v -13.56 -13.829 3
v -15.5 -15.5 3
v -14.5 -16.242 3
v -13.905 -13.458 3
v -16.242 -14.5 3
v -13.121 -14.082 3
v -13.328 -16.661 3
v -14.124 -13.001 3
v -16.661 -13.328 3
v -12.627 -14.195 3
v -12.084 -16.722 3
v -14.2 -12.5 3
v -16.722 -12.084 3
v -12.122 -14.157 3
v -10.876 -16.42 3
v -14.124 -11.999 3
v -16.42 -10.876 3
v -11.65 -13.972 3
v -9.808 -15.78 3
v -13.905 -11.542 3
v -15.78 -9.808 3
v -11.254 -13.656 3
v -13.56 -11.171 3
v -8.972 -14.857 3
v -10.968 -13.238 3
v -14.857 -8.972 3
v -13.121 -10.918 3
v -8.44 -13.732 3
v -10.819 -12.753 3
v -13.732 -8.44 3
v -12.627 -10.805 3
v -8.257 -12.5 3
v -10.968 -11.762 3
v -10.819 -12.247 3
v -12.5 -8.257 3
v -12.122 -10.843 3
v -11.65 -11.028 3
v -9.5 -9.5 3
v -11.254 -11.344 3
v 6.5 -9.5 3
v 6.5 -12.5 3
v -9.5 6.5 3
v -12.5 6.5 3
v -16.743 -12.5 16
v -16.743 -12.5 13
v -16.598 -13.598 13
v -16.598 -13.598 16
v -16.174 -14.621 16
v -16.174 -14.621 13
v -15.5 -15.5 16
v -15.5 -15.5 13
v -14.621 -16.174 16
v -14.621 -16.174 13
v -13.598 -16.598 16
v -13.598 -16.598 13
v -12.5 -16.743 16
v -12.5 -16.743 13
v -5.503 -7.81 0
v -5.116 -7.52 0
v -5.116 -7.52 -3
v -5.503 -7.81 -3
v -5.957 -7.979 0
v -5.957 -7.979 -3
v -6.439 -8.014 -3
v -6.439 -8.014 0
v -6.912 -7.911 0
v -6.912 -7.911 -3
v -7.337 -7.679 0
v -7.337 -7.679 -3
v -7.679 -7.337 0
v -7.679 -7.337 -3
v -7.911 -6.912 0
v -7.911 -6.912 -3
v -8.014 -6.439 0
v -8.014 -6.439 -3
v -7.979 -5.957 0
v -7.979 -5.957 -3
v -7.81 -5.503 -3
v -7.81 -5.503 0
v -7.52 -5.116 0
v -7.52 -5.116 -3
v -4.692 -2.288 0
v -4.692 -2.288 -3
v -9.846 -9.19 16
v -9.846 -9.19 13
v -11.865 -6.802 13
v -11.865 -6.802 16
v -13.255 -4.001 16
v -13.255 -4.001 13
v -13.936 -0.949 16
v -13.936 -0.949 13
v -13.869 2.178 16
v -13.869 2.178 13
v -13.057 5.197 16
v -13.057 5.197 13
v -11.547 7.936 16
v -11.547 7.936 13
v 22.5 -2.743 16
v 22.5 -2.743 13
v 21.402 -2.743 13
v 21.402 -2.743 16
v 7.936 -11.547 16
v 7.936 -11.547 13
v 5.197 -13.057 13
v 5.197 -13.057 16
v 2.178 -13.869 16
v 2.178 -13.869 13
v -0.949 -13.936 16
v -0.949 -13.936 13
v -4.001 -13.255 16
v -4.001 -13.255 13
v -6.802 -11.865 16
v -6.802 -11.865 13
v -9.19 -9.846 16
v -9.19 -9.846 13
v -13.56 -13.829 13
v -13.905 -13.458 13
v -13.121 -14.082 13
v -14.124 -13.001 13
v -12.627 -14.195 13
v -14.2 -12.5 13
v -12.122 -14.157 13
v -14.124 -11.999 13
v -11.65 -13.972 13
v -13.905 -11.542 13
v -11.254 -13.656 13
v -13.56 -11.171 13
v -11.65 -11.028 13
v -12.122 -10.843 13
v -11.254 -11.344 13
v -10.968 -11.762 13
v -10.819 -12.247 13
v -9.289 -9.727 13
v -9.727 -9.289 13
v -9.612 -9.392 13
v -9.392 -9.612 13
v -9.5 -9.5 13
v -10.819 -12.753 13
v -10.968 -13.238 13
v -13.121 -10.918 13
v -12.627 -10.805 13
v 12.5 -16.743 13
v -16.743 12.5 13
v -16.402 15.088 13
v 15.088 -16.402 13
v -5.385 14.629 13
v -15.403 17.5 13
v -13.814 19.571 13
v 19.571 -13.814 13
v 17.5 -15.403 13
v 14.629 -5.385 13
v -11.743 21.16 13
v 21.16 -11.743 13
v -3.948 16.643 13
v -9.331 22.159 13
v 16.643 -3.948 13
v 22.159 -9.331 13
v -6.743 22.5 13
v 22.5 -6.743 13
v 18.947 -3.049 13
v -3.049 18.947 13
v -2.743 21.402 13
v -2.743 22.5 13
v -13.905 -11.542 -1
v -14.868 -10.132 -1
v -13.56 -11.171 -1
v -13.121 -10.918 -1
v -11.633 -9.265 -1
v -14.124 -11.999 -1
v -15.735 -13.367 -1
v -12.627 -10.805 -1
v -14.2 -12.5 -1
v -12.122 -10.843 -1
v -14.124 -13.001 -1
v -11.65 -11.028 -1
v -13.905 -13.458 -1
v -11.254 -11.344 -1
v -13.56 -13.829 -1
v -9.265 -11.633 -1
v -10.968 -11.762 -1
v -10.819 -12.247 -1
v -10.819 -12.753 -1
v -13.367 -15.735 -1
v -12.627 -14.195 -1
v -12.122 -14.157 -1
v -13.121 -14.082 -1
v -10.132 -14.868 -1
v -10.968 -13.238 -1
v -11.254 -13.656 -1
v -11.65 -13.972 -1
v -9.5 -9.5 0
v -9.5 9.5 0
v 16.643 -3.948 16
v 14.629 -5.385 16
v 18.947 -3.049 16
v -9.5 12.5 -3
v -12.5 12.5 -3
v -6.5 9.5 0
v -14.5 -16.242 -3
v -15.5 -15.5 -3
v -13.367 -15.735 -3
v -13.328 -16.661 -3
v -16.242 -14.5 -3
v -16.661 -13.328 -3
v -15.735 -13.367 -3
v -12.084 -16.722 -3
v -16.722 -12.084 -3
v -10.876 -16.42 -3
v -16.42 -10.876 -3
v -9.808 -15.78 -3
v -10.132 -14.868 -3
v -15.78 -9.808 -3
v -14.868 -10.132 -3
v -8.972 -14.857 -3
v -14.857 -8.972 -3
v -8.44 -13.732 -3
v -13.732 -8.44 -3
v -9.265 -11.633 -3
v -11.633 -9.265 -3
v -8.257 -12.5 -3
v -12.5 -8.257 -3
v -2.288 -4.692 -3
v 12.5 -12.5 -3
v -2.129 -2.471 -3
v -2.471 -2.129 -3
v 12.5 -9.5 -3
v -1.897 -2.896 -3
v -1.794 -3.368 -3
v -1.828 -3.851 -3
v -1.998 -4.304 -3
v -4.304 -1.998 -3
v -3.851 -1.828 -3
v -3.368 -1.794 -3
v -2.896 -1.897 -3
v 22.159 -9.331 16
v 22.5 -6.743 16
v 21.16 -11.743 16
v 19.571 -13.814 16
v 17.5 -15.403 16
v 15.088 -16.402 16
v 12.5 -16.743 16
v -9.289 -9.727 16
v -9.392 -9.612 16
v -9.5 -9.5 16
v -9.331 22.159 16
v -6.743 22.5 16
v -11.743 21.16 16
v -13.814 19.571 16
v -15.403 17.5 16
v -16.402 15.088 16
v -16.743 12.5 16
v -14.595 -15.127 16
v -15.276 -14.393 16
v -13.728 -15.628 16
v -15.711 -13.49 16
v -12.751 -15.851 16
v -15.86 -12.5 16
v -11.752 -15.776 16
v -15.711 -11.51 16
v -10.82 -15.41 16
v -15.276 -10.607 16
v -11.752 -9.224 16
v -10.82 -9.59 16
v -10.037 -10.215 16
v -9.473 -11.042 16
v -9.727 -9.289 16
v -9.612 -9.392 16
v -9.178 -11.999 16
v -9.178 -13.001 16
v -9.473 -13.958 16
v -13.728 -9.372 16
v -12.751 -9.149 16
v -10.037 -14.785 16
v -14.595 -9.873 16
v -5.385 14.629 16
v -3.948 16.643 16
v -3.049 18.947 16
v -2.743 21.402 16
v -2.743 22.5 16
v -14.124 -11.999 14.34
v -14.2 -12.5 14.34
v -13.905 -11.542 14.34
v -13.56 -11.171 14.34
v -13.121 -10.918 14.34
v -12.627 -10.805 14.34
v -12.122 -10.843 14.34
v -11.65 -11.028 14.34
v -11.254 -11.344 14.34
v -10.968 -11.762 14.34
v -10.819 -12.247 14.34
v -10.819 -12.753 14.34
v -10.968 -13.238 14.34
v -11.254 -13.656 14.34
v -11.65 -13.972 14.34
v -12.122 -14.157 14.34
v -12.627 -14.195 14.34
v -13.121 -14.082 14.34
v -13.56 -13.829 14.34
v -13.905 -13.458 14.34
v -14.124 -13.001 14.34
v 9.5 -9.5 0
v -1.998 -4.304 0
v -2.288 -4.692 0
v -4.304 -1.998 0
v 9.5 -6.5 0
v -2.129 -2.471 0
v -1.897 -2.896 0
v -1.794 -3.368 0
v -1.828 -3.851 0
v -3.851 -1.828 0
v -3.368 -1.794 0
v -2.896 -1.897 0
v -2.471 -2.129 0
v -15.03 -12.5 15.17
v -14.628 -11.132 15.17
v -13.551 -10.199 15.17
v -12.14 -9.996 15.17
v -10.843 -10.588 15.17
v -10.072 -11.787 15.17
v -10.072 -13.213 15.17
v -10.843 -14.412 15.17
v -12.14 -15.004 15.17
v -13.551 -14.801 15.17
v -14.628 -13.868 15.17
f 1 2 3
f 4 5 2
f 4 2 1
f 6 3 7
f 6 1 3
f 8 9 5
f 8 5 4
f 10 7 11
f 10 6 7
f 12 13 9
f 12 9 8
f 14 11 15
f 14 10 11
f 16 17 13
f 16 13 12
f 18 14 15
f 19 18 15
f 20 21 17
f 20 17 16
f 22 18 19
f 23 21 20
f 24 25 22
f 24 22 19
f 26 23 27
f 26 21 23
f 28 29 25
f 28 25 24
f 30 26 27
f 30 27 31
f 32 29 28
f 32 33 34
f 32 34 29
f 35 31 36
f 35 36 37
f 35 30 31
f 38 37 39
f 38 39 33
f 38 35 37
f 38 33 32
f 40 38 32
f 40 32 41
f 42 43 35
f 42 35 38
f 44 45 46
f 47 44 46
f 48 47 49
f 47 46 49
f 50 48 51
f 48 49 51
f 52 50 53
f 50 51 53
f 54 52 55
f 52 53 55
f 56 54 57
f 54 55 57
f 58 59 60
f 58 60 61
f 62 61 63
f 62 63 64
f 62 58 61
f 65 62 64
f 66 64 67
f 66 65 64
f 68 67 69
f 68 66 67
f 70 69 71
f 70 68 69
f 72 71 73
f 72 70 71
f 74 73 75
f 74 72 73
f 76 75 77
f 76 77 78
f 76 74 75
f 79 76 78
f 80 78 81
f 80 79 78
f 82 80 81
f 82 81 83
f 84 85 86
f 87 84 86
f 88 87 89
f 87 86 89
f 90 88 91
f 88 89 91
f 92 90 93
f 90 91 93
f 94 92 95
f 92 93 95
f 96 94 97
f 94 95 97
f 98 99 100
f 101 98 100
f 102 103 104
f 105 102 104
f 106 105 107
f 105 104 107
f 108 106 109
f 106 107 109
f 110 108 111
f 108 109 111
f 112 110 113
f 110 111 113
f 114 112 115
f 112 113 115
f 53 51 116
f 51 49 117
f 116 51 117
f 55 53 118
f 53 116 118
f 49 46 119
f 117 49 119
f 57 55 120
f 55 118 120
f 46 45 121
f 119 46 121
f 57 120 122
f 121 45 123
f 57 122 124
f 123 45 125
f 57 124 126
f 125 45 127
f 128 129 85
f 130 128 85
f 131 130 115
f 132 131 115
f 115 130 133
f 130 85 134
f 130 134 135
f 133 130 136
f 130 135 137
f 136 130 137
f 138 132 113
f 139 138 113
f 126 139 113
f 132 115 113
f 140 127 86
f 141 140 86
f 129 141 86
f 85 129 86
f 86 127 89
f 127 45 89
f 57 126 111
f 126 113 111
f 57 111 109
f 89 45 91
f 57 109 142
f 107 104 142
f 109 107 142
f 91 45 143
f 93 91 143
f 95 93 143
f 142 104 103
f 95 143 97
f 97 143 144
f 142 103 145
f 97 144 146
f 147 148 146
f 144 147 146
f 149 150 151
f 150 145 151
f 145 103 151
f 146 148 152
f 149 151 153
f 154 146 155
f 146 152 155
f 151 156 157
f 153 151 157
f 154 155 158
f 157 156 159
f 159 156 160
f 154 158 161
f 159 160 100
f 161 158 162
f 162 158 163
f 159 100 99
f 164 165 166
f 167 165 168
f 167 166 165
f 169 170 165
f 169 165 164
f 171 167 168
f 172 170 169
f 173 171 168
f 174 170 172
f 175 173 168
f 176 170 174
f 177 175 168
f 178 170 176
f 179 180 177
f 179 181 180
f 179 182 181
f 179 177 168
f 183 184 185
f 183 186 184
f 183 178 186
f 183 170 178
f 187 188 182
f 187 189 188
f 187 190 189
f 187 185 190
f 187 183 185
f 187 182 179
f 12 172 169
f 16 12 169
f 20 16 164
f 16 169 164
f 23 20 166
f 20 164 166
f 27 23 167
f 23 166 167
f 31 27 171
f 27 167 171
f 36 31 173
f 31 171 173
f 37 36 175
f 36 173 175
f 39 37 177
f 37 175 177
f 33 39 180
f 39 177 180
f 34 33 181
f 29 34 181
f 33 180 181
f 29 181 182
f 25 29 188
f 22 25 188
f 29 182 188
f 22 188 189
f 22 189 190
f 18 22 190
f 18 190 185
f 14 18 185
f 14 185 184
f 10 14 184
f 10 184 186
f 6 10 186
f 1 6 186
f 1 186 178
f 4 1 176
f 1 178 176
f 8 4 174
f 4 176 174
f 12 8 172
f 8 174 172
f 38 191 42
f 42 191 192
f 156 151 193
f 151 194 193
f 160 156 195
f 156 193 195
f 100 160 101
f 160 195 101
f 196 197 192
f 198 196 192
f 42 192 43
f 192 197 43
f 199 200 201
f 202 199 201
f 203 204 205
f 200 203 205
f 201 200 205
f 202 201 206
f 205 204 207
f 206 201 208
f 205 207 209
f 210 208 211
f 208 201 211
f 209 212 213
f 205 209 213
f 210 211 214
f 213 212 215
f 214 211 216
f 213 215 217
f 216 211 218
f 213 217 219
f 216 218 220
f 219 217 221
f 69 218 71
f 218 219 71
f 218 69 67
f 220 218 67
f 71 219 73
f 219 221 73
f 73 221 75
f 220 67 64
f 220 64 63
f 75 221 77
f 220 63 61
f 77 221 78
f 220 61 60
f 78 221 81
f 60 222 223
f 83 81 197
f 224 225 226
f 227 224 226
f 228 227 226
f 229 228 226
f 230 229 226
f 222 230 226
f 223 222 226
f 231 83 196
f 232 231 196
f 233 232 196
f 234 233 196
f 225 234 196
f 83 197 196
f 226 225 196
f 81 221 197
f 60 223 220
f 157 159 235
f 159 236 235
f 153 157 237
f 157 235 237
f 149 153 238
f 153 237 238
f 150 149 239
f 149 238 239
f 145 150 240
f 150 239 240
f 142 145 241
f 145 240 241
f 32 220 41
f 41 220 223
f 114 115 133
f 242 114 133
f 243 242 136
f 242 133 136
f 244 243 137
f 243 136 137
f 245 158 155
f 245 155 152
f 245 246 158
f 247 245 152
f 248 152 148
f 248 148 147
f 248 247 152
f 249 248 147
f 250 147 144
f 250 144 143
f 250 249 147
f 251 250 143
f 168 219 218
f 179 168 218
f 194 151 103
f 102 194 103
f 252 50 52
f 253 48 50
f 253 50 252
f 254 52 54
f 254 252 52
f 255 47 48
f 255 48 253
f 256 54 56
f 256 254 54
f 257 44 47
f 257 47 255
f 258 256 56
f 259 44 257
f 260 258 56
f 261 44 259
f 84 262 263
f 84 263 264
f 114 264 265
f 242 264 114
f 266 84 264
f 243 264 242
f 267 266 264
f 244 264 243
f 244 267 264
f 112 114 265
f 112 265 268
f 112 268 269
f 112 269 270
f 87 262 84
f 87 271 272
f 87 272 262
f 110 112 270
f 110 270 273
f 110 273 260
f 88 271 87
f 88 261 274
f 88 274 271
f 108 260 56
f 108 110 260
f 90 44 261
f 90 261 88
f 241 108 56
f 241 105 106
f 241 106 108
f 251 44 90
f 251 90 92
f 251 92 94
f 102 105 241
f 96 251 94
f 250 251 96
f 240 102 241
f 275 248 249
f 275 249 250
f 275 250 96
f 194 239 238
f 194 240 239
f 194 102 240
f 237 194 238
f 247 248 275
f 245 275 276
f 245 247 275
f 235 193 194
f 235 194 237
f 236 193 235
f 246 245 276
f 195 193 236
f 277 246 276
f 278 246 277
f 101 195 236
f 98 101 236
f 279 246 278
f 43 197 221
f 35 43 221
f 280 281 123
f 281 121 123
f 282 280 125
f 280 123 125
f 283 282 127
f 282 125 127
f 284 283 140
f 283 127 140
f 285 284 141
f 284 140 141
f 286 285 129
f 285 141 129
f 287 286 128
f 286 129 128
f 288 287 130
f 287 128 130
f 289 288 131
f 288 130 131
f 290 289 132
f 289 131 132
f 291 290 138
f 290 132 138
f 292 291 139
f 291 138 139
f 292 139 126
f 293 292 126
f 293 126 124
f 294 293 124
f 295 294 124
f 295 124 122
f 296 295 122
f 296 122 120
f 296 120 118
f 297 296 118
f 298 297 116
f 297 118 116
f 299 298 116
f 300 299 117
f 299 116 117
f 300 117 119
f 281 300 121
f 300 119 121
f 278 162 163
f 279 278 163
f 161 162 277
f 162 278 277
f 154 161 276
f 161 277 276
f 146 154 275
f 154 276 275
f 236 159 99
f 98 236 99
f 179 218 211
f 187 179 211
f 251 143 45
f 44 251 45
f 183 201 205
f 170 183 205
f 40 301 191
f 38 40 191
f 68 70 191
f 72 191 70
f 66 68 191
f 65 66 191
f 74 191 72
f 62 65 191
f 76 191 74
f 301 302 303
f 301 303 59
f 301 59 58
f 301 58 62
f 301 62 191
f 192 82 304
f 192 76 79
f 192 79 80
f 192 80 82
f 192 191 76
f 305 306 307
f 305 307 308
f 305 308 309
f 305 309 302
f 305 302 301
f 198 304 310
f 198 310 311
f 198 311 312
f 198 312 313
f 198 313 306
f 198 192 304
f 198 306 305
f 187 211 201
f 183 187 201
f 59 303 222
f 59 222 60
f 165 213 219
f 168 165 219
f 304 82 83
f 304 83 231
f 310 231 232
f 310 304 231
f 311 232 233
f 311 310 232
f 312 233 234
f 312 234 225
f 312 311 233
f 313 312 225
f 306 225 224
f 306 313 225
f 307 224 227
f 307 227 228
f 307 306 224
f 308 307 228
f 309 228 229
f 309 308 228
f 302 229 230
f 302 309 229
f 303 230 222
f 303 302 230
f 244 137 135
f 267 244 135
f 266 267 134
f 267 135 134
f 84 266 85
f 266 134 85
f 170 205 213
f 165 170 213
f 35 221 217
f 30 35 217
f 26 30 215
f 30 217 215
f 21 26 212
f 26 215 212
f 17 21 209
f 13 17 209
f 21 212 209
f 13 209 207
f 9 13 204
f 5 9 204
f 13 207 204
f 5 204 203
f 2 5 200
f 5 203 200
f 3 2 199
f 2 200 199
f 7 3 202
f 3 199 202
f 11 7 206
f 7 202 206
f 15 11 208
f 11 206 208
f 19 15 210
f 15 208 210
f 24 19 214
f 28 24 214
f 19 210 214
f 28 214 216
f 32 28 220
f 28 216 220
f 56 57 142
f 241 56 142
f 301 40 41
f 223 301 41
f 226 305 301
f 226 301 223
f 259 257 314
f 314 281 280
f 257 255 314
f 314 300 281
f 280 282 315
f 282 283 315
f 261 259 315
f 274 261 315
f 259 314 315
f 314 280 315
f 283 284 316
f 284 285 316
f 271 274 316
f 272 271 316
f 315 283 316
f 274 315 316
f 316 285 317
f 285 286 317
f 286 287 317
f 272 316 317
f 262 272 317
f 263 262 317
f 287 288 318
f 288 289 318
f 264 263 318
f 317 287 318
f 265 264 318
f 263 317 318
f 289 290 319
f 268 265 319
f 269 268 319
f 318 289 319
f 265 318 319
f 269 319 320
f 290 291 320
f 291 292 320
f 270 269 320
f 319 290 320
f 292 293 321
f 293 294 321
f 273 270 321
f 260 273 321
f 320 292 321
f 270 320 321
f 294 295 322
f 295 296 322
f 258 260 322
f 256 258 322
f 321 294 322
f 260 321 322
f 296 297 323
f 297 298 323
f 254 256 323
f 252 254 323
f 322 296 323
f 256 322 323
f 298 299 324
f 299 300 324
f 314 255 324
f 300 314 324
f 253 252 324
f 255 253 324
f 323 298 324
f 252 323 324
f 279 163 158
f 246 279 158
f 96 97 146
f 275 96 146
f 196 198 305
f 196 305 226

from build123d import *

# Parameters (mm, degrees)
F1_DEPTH         = 3
F2_DEPTH         = 3
F5_DEPTH         = 3
F7_D             = 3.4
F7_DEPTH         = 50
F7_CSINK_D       = 6.72
F7_CSINK_ANGLE   = 90
F7_TIP           = 1.0214630523
F7_2_D           = 3.4
F7_2_DEPTH       = 50
F7_2_CSINK_D     = 6.72
F7_2_CSINK_ANGLE = 90
F7_2_TIP         = 1.0214630523
F9_DEPTH         = 2
F10_R            = 10
F11_T1_DEPTH     = 33.8601958556
F11_T3_DEPTH     = 33.8601958556


# Not quite as in the source:
# - a fillet or chamfer that OpenCascade refuses, or shapes differently, is made with other operations: its cross-section is extruded or revolved along the edge and cut away or added
# - a feature names something its author has since deleted; it is built from what else it names


with BuildPart() as f1:
    # F0 (on Top) → F1 (new body)
    with BuildSketch(Plane.XY):
        with BuildLine():
            ThreePointArc((-12.5, -8.2573593129), (-10.8764116996, -8.5803111054), (-9.5, -9.5))
            Line((-9.5, -9.5), (-9.5, 12.5))
            Line((-9.5, 12.5), (-12.5, 12.5))
            Line((-12.5, 12.5), (-12.5, -8.2573593129))
        make_face()
        with BuildLine():
            Line((-8.2573593129, -12.5), (12.5, -12.5))
            Line((12.5, -12.5), (12.5, -9.5))
            Line((12.5, -9.5), (-9.5, -9.5))
            ThreePointArc((-9.5, -9.5), (-8.5803111054, -10.8764116996), (-8.2573593129, -12.5))
        make_face()
        with BuildLine():
            Line((-12.5, -12.5), (-8.2573593129, -12.5))
            ThreePointArc((-8.2573593129, -12.5), (-8.5803111054, -10.8764116996), (-9.5, -9.5))
            ThreePointArc((-9.5, -9.5), (-10.8764116996, -8.5803111054), (-12.5, -8.2573593129))
            Line((-12.5, -8.2573593129), (-12.5, -12.5))
        make_face()
        with BuildLine():
            ThreePointArc((-12.5, -8.2573593129), (-15.5, -15.5), (-8.2573593129, -12.5))
            Line((-8.2573593129, -12.5), (-12.5, -12.5))
            Line((-12.5, -12.5), (-12.5, -8.2573593129))
        make_face()
        Polygon((-9.5, -9.5), (12.5, -9.5), (-9.5, 12.5), align=None)
        with BuildLine():
            Line((-2.2875108319, -4.6916738879), (-5.1159379566, -7.5201010127))
            ThreePointArc((-5.1159379566, -7.5201010127), (-7.5201010127, -7.5201010127), (-7.5201010127, -5.1159379566))
            Line((-7.5201010127, -5.1159379566), (-4.6916738879, -2.2875108319))
            ThreePointArc((-4.6916738879, -2.2875108319), (-2.2875108319, -2.2875108319), (-2.2875108319, -4.6916738879))
        make_face(mode=Mode.SUBTRACT)
    extrude(amount=-F1_DEPTH)

    # F0 (on Top) → F2 (join)
    with BuildSketch(Plane.XY):
        with BuildLine():
            ThreePointArc((-12.5, -8.2573593129), (-15.5, -15.5), (-8.2573593129, -12.5))
            Line((-8.2573593129, -12.5), (-12.5, -12.5))
            Line((-12.5, -12.5), (-12.5, -8.2573593129))
        make_face()
        with BuildLine():
            Line((-12.5, -12.5), (-8.2573593129, -12.5))
            ThreePointArc((-8.2573593129, -12.5), (-8.5803111054, -10.8764116996), (-9.5, -9.5))
            ThreePointArc((-9.5, -9.5), (-10.8764116996, -8.5803111054), (-12.5, -8.2573593129))
            Line((-12.5, -8.2573593129), (-12.5, -12.5))
        make_face()
        with BuildLine():
            ThreePointArc((-12.5, -8.2573593129), (-10.8764116996, -8.5803111054), (-9.5, -9.5))
            Line((-9.5, -9.5), (-9.5, 12.5))
            Line((-9.5, 12.5), (-12.5, 12.5))
            Line((-12.5, 12.5), (-12.5, -8.2573593129))
        make_face()
        with BuildLine():
            Line((-8.2573593129, -12.5), (12.5, -12.5))
            Line((12.5, -12.5), (12.5, -9.5))
            Line((12.5, -9.5), (-9.5, -9.5))
            ThreePointArc((-9.5, -9.5), (-8.5803111054, -10.8764116996), (-8.2573593129, -12.5))
        make_face()
    extrude(amount=F2_DEPTH)

    # F7
    with Locations(Plane.XY.offset(16)):
        with Locations((-12.5, -12.5)):
            CounterSinkHole(F7_D / 2, F7_CSINK_D / 2, depth=F7_DEPTH, counter_sink_angle=F7_CSINK_ANGLE)
            with Locations((0, 0, -(F7_DEPTH + F7_TIP / 2))):  # 118° drill point
                Cone(0, F7_D / 2, F7_TIP, mode=Mode.SUBTRACT)

    # F8 (on face) → F9 (cut)
    with BuildSketch(Plane(origin=(0, 0, -3), x_dir=(1, 0, 0), z_dir=(0, 0, -1))):
        Polygon((-13.3666896231, 15.7345297078), (-15.7345297078, 13.3666896231), (-14.8678400847, 10.1321599153), (-11.6333103769, 9.2654702922), (-9.2654702922, 11.6333103769), (-10.1321599153, 14.8678400847), align=None)
    extrude(amount=-F9_DEPTH, mode=Mode.SUBTRACT)

    # F11: chamfer of 6 on 2 edges, made by hand

    # F11_s2 → F11_t1 (cut)
    with BuildSketch(Plane.XZ.offset(-5.9300979278)):
        Polygon((6.5, 3), (12.5, -3), (12.5, 3), align=None)
    extrude(amount=F11_T1_DEPTH, mode=Mode.SUBTRACT)

    # F11_s4 → F11_t3 (cut)
    with BuildSketch(Plane.YZ.offset(-27.9300979278)):
        Polygon((12.5, -3), (6.5, 3), (12.5, 3), align=None)
    extrude(amount=F11_T3_DEPTH, mode=Mode.SUBTRACT)


with BuildPart() as f5:
    # F4 (on offset) → F5 (new body)
    with BuildSketch(Plane.XY.offset(13)):
        with BuildLine():
            ThreePointArc((-9.8464677493, -9.1895972156), (-14.3360305156, -8.6752134771), (-16.7426406871, -12.5))
            ThreePointArc((-16.7426406871, -12.5), (-15.5, -15.5), (-12.5, -16.7426406871))
            ThreePointArc((-12.5, -16.7426406871), (-9.5, -15.5), (-8.2573593129, -12.5))
            ThreePointArc((-8.2573593129, -12.5), (-8.497197885, -11.0937371412), (-9.1895972156, -9.8464677493))
            ThreePointArc((-9.1895972156, -9.8464677493), (-9.3463484327, -9.6746223732), (-9.5, -9.5))
            ThreePointArc((-9.5, -9.5), (-9.6746223732, -9.3463484327), (-9.8464677493, -9.1895972156))
        make_face()
        with BuildLine():
            Line((-16.7426406871, 22.5), (-16.7426406871, -12.5))
            ThreePointArc((-16.7426406871, -12.5), (-14.3360305156, -8.6752134771), (-9.8464677493, -9.1895972156))
            ThreePointArc((-9.8464677493, -9.1895972156), (-13.936348556, -0.9487103143), (-11.5473889556, 7.935670022))
            Line((-11.5473889556, 7.935670022), (-2.7426406871, 17.5))
            Line((-2.7426406871, 17.5), (-2.7426406871, 22.5))
            Line((-2.7426406871, 22.5), (-16.7426406871, 22.5))
        make_face()
        with BuildLine():
            ThreePointArc((-8.2573593129, -12.5), (-9.5, -15.5), (-12.5, -16.7426406871))
            Line((-12.5, -16.7426406871), (22.5, -16.7426406871))
            Line((22.5, -16.7426406871), (22.5, -2.7426406871))
            Line((22.5, -2.7426406871), (17.5, -2.7426406871))
            Line((17.5, -2.7426406871), (7.935670022, -11.5473889556))
            ThreePointArc((7.935670022, -11.5473889556), (-0.9487103143, -13.936348556), (-9.1895972156, -9.8464677493))
            ThreePointArc((-9.1895972156, -9.8464677493), (-8.497197885, -11.0937371412), (-8.2573593129, -12.5))
        make_face()
        with BuildLine():
            ThreePointArc((-9.5, -9.5), (-9.6689764749, -9.3400465509), (-9.8464677493, -9.1895972156))
            ThreePointArc((-9.8464677493, -9.1895972156), (-9.6746223732, -9.3463484327), (-9.5, -9.5))
        make_face()
        with BuildLine():
            ThreePointArc((-9.1895972156, -9.8464677493), (-9.3400465509, -9.6689764749), (-9.5, -9.5))
            ThreePointArc((-9.5, -9.5), (-9.3463484327, -9.6746223732), (-9.1895972156, -9.8464677493))
        make_face()
    extrude(amount=F5_DEPTH)

    # F7#2
    with Locations(Plane.XY.offset(16)):
        with Locations((-12.5, -12.5)):
            CounterSinkHole(F7_2_D / 2, F7_2_CSINK_D / 2, depth=F7_2_DEPTH, counter_sink_angle=F7_2_CSINK_ANGLE)
            with Locations((0, 0, -(F7_2_DEPTH + F7_2_TIP / 2))):  # 118° drill point
                Cone(0, F7_2_D / 2, F7_2_TIP, mode=Mode.SUBTRACT)

    # F10
    f10_edges = [f5.edges().sort_by_distance(p)[0] for p in [
        (-16.742641, 22.5, 14.5),
        (22.5, -16.742641, 14.5),
        (-2.742641, 17.5, 14.5),
        (17.5, -2.742641, 14.5),
    ]]
    fillet(f10_edges, radius=F10_R)


solid = Compound([f1.part, f5.part])
